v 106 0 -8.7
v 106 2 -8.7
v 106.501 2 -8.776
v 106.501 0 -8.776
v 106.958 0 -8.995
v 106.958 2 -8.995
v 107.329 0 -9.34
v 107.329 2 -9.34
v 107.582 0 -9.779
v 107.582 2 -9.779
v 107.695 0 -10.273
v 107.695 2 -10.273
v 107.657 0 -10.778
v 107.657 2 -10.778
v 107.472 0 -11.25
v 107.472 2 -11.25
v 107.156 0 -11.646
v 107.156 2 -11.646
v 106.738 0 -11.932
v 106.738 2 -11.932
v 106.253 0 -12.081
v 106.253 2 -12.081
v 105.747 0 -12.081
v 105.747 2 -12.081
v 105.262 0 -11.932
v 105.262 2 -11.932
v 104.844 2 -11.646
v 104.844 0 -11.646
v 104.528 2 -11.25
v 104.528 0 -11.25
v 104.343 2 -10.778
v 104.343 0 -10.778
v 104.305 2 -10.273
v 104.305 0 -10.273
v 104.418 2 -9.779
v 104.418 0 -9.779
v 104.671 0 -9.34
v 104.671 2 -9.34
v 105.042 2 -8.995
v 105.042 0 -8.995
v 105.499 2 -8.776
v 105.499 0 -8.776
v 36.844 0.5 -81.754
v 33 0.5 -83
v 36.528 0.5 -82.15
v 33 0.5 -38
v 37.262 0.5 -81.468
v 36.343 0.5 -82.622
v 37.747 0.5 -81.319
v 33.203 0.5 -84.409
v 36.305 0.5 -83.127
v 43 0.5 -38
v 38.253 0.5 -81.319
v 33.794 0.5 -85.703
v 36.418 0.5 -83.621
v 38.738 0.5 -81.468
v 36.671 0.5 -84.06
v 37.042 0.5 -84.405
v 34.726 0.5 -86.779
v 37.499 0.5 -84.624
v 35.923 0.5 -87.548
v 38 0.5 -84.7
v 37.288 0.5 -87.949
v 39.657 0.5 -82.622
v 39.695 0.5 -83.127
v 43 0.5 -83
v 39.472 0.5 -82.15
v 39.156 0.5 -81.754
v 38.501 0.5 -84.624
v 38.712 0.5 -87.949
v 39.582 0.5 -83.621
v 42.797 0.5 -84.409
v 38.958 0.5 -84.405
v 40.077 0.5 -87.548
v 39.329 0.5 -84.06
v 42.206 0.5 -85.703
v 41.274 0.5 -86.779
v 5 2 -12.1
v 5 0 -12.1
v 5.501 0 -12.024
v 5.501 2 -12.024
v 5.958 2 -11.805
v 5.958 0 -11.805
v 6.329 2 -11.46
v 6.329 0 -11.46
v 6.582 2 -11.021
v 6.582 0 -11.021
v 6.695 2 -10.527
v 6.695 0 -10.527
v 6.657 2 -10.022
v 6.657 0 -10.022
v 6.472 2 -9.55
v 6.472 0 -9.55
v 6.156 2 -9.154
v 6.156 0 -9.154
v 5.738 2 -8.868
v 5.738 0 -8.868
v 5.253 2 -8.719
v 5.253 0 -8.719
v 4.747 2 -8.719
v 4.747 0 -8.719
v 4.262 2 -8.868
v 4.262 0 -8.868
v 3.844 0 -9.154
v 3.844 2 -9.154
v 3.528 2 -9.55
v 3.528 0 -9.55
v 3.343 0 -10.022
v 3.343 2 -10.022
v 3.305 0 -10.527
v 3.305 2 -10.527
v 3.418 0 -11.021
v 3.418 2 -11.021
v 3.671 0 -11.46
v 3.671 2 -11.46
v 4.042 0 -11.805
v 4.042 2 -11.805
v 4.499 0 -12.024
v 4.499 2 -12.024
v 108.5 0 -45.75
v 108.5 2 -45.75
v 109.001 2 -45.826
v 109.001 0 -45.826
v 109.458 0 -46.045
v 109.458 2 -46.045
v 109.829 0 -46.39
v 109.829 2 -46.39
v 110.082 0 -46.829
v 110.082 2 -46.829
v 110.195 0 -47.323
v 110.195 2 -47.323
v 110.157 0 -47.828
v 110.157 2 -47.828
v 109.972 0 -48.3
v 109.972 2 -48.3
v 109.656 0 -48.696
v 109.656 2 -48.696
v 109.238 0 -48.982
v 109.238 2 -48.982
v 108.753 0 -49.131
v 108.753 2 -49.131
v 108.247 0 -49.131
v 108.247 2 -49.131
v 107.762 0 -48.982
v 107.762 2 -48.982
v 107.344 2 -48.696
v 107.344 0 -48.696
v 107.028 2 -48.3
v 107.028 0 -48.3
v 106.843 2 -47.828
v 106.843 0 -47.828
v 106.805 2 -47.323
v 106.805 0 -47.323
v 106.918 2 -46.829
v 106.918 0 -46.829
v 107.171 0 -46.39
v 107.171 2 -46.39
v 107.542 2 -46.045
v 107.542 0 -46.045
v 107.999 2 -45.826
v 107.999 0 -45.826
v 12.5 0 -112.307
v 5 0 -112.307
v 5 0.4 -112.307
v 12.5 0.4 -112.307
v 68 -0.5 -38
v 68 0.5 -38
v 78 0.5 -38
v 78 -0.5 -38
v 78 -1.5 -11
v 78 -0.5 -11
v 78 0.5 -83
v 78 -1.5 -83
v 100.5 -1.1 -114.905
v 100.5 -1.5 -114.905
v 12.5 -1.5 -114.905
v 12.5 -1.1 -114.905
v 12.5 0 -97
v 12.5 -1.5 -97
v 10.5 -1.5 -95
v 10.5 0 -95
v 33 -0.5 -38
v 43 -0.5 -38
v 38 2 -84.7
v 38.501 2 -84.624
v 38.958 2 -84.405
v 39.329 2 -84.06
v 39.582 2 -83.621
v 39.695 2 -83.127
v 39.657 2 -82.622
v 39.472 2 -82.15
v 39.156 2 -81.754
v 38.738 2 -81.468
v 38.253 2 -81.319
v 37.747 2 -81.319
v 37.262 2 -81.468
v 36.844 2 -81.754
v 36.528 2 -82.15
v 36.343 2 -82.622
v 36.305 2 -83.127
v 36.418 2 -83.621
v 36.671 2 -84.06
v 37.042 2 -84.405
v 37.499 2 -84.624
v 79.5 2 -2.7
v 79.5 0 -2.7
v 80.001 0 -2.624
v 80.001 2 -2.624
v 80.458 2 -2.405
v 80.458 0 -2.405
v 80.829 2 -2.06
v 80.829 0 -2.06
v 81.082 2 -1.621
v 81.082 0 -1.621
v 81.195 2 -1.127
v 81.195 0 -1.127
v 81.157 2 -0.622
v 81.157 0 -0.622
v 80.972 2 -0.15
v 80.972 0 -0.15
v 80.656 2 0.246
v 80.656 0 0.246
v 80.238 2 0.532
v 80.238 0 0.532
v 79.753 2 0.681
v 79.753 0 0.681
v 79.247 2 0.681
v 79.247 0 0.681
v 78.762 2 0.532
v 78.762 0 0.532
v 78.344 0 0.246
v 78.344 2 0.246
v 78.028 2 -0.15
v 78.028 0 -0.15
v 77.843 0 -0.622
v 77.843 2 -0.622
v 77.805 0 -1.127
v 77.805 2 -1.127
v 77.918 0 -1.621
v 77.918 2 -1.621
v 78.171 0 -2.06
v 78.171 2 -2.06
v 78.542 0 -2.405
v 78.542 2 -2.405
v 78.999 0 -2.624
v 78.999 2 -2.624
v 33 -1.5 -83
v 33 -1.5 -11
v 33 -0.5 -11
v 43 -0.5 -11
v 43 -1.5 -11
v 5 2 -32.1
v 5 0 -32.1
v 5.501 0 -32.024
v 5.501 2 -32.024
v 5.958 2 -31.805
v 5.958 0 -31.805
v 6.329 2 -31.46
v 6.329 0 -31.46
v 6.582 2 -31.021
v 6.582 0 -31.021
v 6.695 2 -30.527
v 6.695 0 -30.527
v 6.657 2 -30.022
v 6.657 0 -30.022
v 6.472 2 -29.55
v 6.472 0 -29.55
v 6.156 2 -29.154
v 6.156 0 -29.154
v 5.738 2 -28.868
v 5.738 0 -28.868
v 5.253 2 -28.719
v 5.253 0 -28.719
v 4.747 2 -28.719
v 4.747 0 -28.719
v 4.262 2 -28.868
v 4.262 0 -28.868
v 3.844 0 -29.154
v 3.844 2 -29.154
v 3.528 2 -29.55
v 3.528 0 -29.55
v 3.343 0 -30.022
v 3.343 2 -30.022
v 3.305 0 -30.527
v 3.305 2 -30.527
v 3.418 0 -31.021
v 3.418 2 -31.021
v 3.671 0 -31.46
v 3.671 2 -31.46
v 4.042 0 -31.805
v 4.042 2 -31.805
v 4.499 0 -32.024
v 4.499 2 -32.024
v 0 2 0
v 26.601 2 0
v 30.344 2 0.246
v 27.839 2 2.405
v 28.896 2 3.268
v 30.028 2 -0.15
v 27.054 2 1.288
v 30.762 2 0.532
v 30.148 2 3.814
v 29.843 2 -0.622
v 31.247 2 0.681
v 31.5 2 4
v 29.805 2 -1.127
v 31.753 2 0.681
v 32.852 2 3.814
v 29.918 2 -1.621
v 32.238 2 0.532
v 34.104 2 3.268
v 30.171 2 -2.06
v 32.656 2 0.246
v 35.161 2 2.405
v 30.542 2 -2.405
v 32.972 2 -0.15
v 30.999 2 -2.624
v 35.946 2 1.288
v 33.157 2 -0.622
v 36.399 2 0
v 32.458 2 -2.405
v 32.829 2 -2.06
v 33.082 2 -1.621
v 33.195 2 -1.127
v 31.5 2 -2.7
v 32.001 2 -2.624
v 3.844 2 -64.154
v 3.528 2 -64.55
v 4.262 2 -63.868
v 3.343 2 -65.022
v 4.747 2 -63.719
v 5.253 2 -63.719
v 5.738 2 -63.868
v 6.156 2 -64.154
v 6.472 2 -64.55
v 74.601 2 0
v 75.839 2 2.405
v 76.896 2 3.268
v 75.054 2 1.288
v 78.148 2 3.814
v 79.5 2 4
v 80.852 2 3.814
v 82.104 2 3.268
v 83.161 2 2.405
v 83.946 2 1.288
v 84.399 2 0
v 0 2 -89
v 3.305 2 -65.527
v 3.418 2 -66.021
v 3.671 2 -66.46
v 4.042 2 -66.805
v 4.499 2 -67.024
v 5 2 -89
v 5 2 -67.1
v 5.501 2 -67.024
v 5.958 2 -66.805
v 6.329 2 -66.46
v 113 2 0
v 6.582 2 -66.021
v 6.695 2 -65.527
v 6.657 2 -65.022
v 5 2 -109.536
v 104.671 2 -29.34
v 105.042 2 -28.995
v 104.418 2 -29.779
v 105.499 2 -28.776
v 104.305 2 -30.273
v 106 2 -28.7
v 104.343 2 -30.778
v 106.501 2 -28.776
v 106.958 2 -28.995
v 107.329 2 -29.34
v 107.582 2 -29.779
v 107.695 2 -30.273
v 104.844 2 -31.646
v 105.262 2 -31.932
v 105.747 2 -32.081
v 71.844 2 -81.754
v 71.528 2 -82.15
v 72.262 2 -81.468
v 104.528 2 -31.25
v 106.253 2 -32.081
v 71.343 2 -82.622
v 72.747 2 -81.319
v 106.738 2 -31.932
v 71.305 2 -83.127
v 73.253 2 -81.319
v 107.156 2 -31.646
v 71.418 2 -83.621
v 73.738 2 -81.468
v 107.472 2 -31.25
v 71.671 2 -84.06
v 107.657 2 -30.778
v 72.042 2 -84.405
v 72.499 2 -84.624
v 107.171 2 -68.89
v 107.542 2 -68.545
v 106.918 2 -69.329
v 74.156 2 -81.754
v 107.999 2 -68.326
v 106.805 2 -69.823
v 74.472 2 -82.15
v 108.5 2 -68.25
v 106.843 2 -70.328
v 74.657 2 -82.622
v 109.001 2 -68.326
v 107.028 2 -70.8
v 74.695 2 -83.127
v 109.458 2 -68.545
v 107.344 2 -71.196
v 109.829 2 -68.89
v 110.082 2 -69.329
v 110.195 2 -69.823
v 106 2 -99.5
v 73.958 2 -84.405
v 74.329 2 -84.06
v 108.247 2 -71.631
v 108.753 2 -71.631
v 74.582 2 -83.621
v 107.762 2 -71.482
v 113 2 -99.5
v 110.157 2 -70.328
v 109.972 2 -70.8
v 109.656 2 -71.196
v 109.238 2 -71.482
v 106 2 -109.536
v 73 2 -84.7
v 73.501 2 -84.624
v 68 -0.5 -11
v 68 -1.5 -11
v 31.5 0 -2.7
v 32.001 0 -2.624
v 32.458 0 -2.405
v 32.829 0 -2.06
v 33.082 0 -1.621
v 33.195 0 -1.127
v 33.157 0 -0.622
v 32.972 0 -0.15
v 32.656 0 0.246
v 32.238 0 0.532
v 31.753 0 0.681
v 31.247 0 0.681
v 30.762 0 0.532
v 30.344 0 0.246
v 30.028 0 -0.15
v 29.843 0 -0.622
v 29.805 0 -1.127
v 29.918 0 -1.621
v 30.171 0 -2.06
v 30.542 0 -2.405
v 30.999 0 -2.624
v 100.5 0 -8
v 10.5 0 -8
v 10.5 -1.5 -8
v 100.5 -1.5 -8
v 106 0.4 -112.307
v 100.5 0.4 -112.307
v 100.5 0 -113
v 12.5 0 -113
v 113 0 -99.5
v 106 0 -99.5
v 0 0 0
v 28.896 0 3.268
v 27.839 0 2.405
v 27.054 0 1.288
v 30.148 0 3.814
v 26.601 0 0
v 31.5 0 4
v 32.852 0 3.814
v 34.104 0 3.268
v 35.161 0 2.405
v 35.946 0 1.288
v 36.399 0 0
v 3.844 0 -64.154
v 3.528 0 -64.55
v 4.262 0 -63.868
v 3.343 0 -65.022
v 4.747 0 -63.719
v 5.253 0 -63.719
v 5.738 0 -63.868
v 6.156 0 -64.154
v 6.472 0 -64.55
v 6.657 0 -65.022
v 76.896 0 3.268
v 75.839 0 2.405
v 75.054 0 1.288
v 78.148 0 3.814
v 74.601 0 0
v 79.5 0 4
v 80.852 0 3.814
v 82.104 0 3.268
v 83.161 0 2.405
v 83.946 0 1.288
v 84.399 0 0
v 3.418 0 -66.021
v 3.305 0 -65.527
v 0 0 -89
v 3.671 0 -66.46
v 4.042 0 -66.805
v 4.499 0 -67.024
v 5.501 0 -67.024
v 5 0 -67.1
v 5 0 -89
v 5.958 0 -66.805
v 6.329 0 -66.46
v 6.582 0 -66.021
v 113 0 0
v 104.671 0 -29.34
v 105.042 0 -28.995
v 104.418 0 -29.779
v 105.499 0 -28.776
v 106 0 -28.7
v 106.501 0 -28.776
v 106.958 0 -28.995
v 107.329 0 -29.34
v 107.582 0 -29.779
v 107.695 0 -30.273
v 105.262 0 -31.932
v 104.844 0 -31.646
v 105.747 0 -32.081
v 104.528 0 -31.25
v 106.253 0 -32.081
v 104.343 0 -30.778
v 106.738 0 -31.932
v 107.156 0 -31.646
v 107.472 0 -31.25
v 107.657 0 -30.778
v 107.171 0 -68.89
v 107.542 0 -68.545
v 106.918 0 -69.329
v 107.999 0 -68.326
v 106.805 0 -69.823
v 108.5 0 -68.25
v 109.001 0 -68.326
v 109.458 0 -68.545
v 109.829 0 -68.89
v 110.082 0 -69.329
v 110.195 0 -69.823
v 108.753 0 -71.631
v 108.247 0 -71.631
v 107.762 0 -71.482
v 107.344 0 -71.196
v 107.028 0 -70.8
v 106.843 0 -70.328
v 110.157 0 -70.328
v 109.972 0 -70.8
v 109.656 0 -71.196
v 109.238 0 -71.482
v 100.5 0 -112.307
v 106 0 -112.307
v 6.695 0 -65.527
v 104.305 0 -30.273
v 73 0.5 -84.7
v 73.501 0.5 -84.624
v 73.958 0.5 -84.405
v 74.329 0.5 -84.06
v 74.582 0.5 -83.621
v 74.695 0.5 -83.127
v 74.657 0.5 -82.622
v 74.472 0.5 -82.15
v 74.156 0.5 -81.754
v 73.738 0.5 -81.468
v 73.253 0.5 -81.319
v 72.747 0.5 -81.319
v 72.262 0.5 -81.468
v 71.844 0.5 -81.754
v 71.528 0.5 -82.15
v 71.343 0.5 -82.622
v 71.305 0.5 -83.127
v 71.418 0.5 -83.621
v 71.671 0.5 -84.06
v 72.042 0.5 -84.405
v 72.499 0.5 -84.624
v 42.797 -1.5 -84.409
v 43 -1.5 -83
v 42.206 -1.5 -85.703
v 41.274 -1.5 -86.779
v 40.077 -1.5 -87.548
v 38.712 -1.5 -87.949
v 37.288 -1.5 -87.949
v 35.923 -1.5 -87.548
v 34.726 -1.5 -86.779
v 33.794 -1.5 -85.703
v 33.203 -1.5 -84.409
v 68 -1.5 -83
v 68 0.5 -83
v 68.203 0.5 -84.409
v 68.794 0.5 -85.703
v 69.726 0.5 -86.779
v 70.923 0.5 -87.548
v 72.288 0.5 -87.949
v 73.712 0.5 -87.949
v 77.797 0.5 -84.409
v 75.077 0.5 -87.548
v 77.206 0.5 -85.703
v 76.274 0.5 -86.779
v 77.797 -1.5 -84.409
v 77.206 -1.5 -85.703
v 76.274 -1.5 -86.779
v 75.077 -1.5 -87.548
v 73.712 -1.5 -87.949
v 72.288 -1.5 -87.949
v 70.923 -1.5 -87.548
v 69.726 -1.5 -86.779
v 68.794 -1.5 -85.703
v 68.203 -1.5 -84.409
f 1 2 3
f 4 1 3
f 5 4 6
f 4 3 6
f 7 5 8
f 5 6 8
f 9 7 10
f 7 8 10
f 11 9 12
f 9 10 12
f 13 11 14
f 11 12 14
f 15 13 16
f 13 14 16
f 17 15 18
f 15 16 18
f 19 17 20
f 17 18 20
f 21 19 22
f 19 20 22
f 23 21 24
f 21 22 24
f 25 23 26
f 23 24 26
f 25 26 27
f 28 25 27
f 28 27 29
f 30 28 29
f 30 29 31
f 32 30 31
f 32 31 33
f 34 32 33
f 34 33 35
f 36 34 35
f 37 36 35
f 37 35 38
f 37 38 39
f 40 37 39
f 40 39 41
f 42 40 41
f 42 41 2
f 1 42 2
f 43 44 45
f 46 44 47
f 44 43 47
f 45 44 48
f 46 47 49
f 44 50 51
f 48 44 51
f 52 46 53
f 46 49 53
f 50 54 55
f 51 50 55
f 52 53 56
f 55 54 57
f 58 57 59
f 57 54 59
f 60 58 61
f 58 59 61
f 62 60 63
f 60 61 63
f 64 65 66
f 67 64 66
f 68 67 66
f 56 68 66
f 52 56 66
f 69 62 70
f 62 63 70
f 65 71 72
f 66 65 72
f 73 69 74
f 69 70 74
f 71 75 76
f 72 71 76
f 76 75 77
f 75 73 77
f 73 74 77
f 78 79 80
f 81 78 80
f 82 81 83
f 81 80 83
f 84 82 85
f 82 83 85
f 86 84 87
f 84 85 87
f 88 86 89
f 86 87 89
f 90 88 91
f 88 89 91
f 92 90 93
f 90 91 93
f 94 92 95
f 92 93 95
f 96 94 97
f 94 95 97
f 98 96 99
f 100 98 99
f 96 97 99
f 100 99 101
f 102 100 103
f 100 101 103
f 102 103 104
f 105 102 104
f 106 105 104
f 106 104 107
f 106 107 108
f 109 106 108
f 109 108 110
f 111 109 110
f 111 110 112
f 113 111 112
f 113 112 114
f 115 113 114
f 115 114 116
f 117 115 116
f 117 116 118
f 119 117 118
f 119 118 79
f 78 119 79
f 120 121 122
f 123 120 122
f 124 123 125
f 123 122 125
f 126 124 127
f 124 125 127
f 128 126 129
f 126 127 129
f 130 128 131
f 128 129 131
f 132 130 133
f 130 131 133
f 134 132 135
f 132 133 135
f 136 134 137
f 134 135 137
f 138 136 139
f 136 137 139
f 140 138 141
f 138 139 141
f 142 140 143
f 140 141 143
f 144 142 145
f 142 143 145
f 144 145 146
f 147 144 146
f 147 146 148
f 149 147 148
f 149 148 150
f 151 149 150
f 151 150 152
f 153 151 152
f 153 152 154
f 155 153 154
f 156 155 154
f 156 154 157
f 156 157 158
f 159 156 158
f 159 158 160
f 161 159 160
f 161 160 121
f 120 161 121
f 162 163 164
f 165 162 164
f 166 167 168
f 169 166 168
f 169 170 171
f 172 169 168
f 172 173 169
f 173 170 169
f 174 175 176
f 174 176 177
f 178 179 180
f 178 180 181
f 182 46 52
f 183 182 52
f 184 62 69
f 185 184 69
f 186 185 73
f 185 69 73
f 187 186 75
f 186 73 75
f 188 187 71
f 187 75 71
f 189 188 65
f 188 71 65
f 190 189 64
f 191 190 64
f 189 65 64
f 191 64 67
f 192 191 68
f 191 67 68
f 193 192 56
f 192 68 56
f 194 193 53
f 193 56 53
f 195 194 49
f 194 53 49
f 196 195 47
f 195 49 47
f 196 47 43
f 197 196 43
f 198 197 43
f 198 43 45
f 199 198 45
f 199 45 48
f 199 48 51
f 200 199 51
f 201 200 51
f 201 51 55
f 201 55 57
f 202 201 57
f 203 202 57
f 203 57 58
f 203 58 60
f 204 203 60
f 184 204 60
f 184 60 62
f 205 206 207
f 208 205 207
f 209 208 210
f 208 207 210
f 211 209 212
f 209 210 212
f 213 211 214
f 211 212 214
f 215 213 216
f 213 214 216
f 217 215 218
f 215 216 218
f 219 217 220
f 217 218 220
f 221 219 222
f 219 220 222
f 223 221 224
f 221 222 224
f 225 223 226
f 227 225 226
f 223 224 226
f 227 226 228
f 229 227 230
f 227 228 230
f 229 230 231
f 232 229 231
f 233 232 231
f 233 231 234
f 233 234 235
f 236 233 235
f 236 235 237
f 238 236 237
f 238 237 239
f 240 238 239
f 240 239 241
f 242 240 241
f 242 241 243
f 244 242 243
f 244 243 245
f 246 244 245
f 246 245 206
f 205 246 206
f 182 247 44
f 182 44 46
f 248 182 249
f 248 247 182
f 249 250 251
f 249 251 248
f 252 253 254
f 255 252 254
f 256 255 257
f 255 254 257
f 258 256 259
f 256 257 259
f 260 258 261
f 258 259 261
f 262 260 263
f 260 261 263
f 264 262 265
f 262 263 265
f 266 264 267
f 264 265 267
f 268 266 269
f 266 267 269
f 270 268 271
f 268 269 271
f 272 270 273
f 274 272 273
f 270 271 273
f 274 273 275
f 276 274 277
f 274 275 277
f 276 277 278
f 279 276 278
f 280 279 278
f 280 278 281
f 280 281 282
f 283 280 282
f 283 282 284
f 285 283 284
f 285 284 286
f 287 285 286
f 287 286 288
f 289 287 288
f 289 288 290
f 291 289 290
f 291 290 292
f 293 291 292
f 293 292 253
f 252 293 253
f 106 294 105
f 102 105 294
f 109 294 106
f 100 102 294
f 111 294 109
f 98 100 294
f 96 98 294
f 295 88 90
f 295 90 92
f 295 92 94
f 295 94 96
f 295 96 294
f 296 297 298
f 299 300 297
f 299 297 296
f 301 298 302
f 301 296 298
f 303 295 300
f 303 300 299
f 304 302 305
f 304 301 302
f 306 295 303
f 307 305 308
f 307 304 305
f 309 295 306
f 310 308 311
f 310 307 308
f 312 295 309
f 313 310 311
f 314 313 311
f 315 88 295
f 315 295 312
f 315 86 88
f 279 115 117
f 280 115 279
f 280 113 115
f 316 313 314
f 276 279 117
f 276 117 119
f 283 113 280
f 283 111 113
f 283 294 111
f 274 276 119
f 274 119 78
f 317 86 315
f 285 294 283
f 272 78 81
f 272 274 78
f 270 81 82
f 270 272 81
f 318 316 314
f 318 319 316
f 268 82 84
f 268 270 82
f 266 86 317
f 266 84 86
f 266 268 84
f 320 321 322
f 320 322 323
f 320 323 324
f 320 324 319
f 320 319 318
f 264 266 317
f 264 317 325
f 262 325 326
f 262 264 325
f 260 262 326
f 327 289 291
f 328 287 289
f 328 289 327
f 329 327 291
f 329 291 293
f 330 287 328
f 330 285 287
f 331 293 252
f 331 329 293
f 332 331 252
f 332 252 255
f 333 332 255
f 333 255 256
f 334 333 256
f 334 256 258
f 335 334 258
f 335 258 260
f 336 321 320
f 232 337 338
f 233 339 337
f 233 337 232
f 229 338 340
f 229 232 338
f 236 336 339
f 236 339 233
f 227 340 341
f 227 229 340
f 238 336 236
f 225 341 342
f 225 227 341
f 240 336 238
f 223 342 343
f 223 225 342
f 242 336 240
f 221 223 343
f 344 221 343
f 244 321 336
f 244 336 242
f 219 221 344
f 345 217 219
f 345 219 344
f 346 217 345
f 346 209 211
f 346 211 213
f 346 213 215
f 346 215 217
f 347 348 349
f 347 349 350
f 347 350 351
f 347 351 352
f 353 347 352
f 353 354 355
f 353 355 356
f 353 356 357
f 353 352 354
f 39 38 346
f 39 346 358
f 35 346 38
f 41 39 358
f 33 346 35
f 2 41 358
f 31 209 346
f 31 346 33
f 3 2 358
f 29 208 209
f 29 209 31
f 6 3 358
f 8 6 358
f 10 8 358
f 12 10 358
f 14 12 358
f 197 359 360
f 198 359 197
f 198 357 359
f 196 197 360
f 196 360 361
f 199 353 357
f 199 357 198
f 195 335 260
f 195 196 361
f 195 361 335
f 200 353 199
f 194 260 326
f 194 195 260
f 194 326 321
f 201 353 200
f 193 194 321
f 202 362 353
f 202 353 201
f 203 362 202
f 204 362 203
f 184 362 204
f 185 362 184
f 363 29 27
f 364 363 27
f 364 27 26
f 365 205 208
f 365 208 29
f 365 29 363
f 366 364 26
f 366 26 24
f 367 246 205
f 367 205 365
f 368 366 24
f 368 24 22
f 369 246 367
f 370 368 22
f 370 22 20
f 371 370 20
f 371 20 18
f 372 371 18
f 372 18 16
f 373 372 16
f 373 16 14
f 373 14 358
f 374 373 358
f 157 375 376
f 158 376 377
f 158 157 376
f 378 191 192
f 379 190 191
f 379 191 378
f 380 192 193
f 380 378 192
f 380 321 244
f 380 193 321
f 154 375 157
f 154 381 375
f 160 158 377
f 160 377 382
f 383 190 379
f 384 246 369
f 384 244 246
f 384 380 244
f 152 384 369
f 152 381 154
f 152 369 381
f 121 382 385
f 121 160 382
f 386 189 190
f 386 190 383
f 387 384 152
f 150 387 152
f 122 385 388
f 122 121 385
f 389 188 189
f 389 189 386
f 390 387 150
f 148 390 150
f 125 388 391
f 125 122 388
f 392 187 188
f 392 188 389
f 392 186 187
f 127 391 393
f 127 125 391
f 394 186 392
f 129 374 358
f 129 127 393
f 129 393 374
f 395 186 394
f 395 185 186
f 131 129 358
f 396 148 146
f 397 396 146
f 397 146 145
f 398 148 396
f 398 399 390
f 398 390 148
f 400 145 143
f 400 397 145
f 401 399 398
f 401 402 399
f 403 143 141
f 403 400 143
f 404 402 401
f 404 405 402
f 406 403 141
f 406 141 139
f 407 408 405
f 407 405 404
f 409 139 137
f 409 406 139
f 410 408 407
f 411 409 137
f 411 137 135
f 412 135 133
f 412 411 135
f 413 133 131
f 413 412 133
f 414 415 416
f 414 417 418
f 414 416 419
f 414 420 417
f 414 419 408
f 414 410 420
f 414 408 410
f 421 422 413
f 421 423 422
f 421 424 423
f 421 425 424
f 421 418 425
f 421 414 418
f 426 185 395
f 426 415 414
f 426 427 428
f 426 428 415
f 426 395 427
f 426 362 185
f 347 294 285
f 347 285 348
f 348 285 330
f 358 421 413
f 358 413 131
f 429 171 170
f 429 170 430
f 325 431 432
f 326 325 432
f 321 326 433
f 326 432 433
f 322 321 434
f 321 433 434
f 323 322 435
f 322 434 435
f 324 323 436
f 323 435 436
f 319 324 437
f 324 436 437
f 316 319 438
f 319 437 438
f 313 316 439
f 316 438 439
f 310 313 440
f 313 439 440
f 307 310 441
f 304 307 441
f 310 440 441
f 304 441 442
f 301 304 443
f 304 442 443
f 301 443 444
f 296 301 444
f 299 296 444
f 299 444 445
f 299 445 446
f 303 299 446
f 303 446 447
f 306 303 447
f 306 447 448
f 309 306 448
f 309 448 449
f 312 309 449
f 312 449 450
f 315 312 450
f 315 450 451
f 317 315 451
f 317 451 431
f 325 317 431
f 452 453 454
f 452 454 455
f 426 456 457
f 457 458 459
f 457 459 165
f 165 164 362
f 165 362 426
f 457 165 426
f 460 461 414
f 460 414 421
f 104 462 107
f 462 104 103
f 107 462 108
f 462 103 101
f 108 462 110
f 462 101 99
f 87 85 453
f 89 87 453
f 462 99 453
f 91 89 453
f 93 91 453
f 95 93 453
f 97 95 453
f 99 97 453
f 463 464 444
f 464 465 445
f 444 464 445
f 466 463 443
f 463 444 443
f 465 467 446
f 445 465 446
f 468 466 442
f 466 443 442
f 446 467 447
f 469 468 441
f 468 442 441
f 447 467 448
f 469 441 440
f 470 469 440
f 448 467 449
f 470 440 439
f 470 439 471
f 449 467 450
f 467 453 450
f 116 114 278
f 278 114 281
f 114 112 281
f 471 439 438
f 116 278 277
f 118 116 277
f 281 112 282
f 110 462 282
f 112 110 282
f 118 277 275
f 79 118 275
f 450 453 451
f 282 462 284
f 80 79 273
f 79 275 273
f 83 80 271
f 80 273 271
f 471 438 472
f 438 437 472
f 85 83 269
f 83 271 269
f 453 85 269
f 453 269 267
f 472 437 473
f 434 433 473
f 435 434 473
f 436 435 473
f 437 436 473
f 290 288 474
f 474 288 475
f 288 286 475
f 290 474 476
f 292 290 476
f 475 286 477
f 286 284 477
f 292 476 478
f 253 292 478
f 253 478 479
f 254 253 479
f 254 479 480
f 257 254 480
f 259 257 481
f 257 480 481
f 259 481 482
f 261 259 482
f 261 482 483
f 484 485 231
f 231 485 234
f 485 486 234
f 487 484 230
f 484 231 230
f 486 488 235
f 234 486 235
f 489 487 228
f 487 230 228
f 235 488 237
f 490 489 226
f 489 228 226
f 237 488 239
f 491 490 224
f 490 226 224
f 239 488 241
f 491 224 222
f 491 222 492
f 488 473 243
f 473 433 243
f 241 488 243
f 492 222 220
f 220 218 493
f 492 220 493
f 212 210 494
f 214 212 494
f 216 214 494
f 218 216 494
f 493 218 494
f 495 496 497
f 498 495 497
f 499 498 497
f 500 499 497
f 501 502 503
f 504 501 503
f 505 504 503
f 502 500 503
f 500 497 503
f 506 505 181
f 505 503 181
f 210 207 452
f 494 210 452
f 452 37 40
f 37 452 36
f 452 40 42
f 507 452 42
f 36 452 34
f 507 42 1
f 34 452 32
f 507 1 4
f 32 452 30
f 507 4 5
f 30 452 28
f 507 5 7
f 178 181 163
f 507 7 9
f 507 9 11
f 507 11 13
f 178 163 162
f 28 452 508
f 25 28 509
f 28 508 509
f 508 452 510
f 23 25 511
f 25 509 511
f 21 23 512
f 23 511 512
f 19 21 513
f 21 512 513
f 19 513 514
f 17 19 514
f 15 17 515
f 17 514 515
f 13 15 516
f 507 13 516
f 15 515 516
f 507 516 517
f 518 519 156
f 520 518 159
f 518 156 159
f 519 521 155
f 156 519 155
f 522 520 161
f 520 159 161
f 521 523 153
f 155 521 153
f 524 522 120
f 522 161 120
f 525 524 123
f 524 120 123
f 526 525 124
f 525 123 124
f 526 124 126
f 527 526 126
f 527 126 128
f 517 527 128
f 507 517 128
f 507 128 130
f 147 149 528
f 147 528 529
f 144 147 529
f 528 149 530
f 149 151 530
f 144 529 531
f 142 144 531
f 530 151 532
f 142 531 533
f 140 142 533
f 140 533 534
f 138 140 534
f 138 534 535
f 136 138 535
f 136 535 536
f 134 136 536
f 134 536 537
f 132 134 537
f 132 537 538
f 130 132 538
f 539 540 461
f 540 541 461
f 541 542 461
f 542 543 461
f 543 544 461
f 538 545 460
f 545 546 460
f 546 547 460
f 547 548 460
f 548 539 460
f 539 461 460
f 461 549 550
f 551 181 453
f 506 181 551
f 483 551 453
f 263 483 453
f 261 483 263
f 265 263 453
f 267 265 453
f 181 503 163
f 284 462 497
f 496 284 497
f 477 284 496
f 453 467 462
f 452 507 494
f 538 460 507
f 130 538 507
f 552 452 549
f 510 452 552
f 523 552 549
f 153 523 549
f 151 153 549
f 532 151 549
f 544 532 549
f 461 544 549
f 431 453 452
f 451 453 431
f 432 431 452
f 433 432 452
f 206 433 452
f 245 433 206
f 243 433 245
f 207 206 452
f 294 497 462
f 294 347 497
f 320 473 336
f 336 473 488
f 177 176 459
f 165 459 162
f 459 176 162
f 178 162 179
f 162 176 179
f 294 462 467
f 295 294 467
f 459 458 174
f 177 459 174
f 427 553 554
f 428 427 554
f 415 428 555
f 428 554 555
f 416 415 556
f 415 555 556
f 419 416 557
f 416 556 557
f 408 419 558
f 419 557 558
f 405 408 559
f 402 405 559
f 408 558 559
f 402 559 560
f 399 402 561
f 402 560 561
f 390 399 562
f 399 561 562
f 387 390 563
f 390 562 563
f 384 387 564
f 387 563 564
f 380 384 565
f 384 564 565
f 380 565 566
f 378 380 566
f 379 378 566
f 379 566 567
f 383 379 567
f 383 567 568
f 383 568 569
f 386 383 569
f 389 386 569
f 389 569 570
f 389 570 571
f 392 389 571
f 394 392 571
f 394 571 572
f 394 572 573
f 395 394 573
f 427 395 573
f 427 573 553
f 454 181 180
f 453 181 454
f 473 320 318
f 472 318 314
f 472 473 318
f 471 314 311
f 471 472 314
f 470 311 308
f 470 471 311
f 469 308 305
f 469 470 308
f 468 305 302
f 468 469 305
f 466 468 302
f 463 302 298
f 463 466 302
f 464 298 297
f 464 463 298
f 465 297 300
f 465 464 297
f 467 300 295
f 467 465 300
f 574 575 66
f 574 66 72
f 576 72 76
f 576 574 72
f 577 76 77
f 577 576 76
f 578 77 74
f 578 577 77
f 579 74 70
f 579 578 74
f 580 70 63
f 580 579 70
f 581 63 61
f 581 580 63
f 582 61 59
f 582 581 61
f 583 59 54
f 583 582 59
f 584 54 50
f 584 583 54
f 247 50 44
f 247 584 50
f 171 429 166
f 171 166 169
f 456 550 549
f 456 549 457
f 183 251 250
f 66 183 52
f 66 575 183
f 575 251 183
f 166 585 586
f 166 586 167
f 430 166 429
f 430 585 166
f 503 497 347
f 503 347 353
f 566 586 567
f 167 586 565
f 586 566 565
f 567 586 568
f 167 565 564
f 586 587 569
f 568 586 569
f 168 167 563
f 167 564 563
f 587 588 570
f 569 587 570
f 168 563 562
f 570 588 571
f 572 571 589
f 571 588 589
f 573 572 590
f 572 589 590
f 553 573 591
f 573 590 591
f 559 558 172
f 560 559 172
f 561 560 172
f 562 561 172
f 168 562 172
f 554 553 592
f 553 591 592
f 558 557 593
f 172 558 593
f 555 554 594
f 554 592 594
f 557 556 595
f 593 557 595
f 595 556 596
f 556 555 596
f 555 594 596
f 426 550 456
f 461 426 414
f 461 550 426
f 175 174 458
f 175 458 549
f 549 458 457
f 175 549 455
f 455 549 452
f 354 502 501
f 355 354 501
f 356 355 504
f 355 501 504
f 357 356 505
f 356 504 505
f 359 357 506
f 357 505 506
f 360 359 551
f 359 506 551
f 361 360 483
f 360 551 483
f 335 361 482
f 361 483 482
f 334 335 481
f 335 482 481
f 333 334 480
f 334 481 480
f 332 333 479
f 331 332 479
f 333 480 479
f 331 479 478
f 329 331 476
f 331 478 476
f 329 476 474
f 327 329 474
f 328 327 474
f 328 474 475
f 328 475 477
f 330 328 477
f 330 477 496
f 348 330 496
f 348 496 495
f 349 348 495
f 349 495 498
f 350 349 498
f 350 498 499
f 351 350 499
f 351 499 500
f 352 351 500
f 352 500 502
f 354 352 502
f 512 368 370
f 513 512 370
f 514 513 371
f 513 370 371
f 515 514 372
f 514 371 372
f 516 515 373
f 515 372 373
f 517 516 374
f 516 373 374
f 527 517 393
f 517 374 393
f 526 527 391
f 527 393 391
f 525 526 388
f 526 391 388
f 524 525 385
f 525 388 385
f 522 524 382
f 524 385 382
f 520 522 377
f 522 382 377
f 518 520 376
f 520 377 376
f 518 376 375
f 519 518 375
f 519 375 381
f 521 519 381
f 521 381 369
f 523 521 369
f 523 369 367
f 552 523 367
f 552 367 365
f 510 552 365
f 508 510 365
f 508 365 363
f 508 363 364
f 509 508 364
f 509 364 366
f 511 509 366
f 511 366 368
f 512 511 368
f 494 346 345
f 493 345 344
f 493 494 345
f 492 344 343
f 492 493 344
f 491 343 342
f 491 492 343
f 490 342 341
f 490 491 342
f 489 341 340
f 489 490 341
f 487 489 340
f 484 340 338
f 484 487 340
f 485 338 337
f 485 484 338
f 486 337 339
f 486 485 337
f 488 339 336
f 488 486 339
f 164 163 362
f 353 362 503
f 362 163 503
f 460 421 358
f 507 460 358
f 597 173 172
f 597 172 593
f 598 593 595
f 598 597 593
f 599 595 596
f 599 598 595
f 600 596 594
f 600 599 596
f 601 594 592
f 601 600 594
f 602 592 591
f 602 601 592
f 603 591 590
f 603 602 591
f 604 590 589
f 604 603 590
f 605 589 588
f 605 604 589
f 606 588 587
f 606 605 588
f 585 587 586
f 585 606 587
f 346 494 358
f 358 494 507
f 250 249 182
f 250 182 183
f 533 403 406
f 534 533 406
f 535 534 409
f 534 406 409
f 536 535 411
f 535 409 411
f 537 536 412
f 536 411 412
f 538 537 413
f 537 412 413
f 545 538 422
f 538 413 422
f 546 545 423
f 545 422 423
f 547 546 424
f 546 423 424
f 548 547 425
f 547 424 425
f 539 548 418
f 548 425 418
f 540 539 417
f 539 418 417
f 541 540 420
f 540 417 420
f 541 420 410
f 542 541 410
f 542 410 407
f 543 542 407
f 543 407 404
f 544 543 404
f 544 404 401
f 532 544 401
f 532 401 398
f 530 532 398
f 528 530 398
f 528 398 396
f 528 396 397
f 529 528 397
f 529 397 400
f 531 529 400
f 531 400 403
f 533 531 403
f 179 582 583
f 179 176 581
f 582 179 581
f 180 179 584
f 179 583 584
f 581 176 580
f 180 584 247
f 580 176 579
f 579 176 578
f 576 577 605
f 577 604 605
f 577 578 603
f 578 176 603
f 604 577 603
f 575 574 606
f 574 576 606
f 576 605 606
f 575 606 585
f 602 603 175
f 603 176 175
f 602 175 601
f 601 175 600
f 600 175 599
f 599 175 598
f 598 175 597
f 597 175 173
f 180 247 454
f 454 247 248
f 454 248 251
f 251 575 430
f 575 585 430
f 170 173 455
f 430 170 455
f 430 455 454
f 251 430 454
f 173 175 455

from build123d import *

# Parameters (mm, degrees)
SKETCH_1_W           = 113
SKETCH_1_H           = 113
EXTRUDE_1_DEPTH      = 3
CUT_EXTRUDE_1_REACH  = 161.834
SKETCH_2_R           = 1.7
SKETCH_3_W           = 90
SKETCH_3_H           = 105
EXTRUDE_2_DEPTH      = 1.5
SKETCH_5_R           = 5
EXTRUDE_3_DEPTH      = 3
CUT_EXTRUDE_2_REACH  = 161.834
SKETCH_6_R           = 1.7
CUT_EXTRUDE_3_REACH  = 161.834
SKETCH_7_R           = 1.7
CUT_EXTRUDE_4_REACH  = 161.869
SKETCH_8_R           = 1.7
EXTRUDE_5_DEPTH      = 90
CUT_EXTRUDE_5_DEPTH  = 2
SKETCH_13_W          = 2
SKETCH_13_H          = 12
EXTRUDE_6_DEPTH      = 11.5
CUT_EXTRUDE_6_REACH  = 161.985
SKETCH_14_R          = 1.7
CUT_EXTRUDE_7_REACH  = 164.062
EXTRUDE_7_DEPTH      = 8.5
SKETCH_17_W          = 2
SKETCH_17_H          = 11.5
EXTRUDE_8_DEPTH      = 3
FILLET_1_R           = 1
CUT_EXTRUDE_8_DEPTH  = 163.062226394
SKETCH_20_W          = 113
SKETCH_20_H          = 12.124355653
CUT_EXTRUDE_9_DEPTH  = 1
CHAMFER_1_SIZE       = 1
SKETCH_21_W          = 7
SKETCH_21_H          = 13.5
CUT_EXTRUDE_10_DEPTH = 163.062226394
SKETCH_22_W          = 5
SKETCH_22_H          = 24
CUT_EXTRUDE_11_DEPTH = 163.062226394
SKETCH_23_W          = 2
SKETCH_23_H          = 18.598076211
CUT_EXTRUDE_12_DEPTH = 1.5
CHAMFER_2_SIZE       = 2
SKETCH_24_W          = 0.692820323
SKETCH_24_H          = 0.4
CUT_EXTRUDE_13_DEPTH = 95.5
SKETCH_25_W          = 0.692820323
SKETCH_25_H          = 0.4
CUT_EXTRUDE_14_DEPTH = 5.5
SKETCH_26_W          = 0.692820323
SKETCH_26_H          = 0.4
CUT_EXTRUDE_15_DEPTH = 7.5
SKETCH_27_W          = 113
SKETCH_27_H          = 105.875644347
CUT_EXTRUDE_16_DEPTH = 162.723430061
SKETCH_29_W          = 10
SKETCH_29_H          = 5
CUT_EXTRUDE_17_DEPTH = 162.605129345
SKETCH_30_W          = 10
SKETCH_30_H          = 2
CUT_EXTRUDE_18_DEPTH = 37
SKETCH_31_W          = 10
SKETCH_31_H          = 27
EXTRUDE_9_DEPTH      = 1
CUT_EXTRUDE_19_REACH = 163.569
SKETCH_32_W          = 5
SKETCH_32_H          = 12


with BuildPart() as part:
    # 草图1 → 凸台-拉伸1 (new body)
    with BuildSketch(Plane(origin=(0, 0, 0), x_dir=(1, 0, 0), z_dir=(0, 1, 0))):
        with Locations((56.5, 56.5)):
            Rectangle(SKETCH_1_W, SKETCH_1_H)
    extrude(amount=EXTRUDE_1_DEPTH)

    # 草图2 → 切除-拉伸1 (cut, up to next)
    with BuildSketch(Plane(origin=(0, 3, 0), x_dir=(1, 0, 0), z_dir=(0, 1, 0)), mode=Mode.PRIVATE) as cut_extrude_1_sk1:
        with Locations(Location((108.5, 69.95, 0), (0, 0, 270))):
            Circle(SKETCH_2_R)
    cut_extrude_1_tool1 = extrude(cut_extrude_1_sk1.sketch, amount=-CUT_EXTRUDE_1_REACH, mode=Mode.PRIVATE) & part.part
    # 草图2 → 切除-拉伸1 (cut, up to next)
    with BuildSketch(Plane(origin=(0, 3, 0), x_dir=(1, 0, 0), z_dir=(0, 1, 0)), mode=Mode.PRIVATE) as cut_extrude_1_sk2:
        with Locations(Location((108.5, 47.45, 0), (0, 0, 270))):
            Circle(SKETCH_2_R)
    cut_extrude_1_tool2 = extrude(cut_extrude_1_sk2.sketch, amount=-CUT_EXTRUDE_1_REACH, mode=Mode.PRIVATE) & part.part
    # 草图2 → 切除-拉伸1 (cut, up to next)
    with BuildSketch(Plane(origin=(0, 3, 0), x_dir=(1, 0, 0), z_dir=(0, 1, 0)), mode=Mode.PRIVATE) as cut_extrude_1_sk3:
        with Locations(Location((106, 30.4, 0), (0, 0, 270))):
            Circle(SKETCH_2_R)
    cut_extrude_1_tool3 = extrude(cut_extrude_1_sk3.sketch, amount=-CUT_EXTRUDE_1_REACH, mode=Mode.PRIVATE) & part.part
    # 草图2 → 切除-拉伸1 (cut, up to next)
    with BuildSketch(Plane(origin=(0, 3, 0), x_dir=(1, 0, 0), z_dir=(0, 1, 0)), mode=Mode.PRIVATE) as cut_extrude_1_sk4:
        with Locations(Location((106, 10.4, 0), (0, 0, 270))):
            Circle(SKETCH_2_R)
    cut_extrude_1_tool4 = extrude(cut_extrude_1_sk4.sketch, amount=-CUT_EXTRUDE_1_REACH, mode=Mode.PRIVATE) & part.part
    add(cut_extrude_1_tool1.solids().sort_by_distance((108.5, 3, -69.95))[0], mode=Mode.SUBTRACT)
    add(cut_extrude_1_tool2.solids().sort_by_distance((108.5, 3, -47.45))[0], mode=Mode.SUBTRACT)
    add(cut_extrude_1_tool3.solids().sort_by_distance((106, 3, -30.4))[0], mode=Mode.SUBTRACT)
    add(cut_extrude_1_tool4.solids().sort_by_distance((106, 3, -10.4))[0], mode=Mode.SUBTRACT)

    # 草图3 → 凸台-拉伸2 (add)
    with BuildSketch(Plane(origin=(0, 0, 0), x_dir=(1, 0, 0), z_dir=(0, 1, 0))):
        with Locations((55.5, 60.5)):
            Rectangle(SKETCH_3_W, SKETCH_3_H)
    extrude(amount=-EXTRUDE_2_DEPTH)

    # 草图5 → 凸台-拉伸3 (add)
    with BuildSketch(Plane.XZ):
        with Locations((79.5, -1)):
            Circle(SKETCH_5_R)
        with Locations((31.5, -1)):
            Circle(SKETCH_5_R)
    extrude(amount=-EXTRUDE_3_DEPTH)

    # 草图6 → 切除-拉伸2 (cut, up to next)
    with BuildSketch(Plane.XZ, mode=Mode.PRIVATE) as cut_extrude_2_sk1:
        with Locations(Location((31.5, -1, 0), (0, 0, 270))):
            Circle(SKETCH_6_R)
    cut_extrude_2_tool1 = extrude(cut_extrude_2_sk1.sketch, amount=-CUT_EXTRUDE_2_REACH, mode=Mode.PRIVATE) & part.part
    # 草图6 → 切除-拉伸2 (cut, up to next)
    with BuildSketch(Plane.XZ, mode=Mode.PRIVATE) as cut_extrude_2_sk2:
        with Locations(Location((79.5, -1, 0), (0, 0, 270))):
            Circle(SKETCH_6_R)
    cut_extrude_2_tool2 = extrude(cut_extrude_2_sk2.sketch, amount=-CUT_EXTRUDE_2_REACH, mode=Mode.PRIVATE) & part.part
    add(cut_extrude_2_tool1.solids().sort_by_distance((31.5, 0, -1))[0], mode=Mode.SUBTRACT)
    add(cut_extrude_2_tool2.solids().sort_by_distance((79.5, 0, -1))[0], mode=Mode.SUBTRACT)

    # 草图7 → 切除-拉伸3 (cut, up to next)
    with BuildSketch(Plane.XZ, mode=Mode.PRIVATE) as cut_extrude_3_sk1:
        with Locations(Location((5, -10.4, 0), (0, 0, 270))):
            Circle(SKETCH_7_R)
    cut_extrude_3_tool1 = extrude(cut_extrude_3_sk1.sketch, amount=-CUT_EXTRUDE_3_REACH, mode=Mode.PRIVATE) & part.part
    # 草图7 → 切除-拉伸3 (cut, up to next)
    with BuildSketch(Plane.XZ, mode=Mode.PRIVATE) as cut_extrude_3_sk2:
        with Locations(Location((5, -30.4, 0), (0, 0, 270))):
            Circle(SKETCH_7_R)
    cut_extrude_3_tool2 = extrude(cut_extrude_3_sk2.sketch, amount=-CUT_EXTRUDE_3_REACH, mode=Mode.PRIVATE) & part.part
    # 草图7 → 切除-拉伸3 (cut, up to next)
    with BuildSketch(Plane.XZ, mode=Mode.PRIVATE) as cut_extrude_3_sk3:
        with Locations(Location((5, -65.4, 0), (0, 0, 270))):
            Circle(SKETCH_7_R)
    cut_extrude_3_tool3 = extrude(cut_extrude_3_sk3.sketch, amount=-CUT_EXTRUDE_3_REACH, mode=Mode.PRIVATE) & part.part
    add(cut_extrude_3_tool1.solids().sort_by_distance((5, 0, -10.4))[0], mode=Mode.SUBTRACT)
    add(cut_extrude_3_tool2.solids().sort_by_distance((5, 0, -30.4))[0], mode=Mode.SUBTRACT)
    add(cut_extrude_3_tool3.solids().sort_by_distance((5, 0, -65.4))[0], mode=Mode.SUBTRACT)

    # 草图8 → 切除-拉伸4 (cut, up to next)
    with BuildSketch(Plane.XZ.offset(1.5), mode=Mode.PRIVATE) as cut_extrude_4_sk1:
        with Locations(Location((38, -83, 0), (0, 0, 270))):
            Circle(SKETCH_8_R)
    cut_extrude_4_tool1 = extrude(cut_extrude_4_sk1.sketch, amount=-CUT_EXTRUDE_4_REACH, mode=Mode.PRIVATE) & part.part
    # 草图8 → 切除-拉伸4 (cut, up to next)
    with BuildSketch(Plane.XZ.offset(1.5), mode=Mode.PRIVATE) as cut_extrude_4_sk2:
        with Locations(Location((73, -83, 0), (0, 0, 270))):
            Circle(SKETCH_8_R)
    cut_extrude_4_tool2 = extrude(cut_extrude_4_sk2.sketch, amount=-CUT_EXTRUDE_4_REACH, mode=Mode.PRIVATE) & part.part
    add(cut_extrude_4_tool1.solids().sort_by_distance((38, -1.5, -83))[0], mode=Mode.SUBTRACT)
    add(cut_extrude_4_tool2.solids().sort_by_distance((73, -1.5, -83))[0], mode=Mode.SUBTRACT)

    # 草图10 → 凸台-拉伸5 (add)
    with BuildSketch(Plane(origin=(100.5, 0, 0), x_dir=(0, 0, -1), z_dir=(1, 0, 0))):
        Polygon((113, 0), (115.598076211, -1.5), (113, -1.5), align=None)
    extrude(amount=-EXTRUDE_5_DEPTH)

    # 草图11 → 切除-拉伸5 (cut)
    with BuildSketch(Plane(origin=(0, -1.5, 0), x_dir=(1, 0, 0), z_dir=(0, 1, 0))):
        with BuildLine():
            Line((33, 83), (33, 53))
            ThreePointArc((33, 53), (38, 48), (43, 53))
            Line((43, 53), (43, 83))
            ThreePointArc((43, 83), (38, 88), (33, 83))
        make_face()
        with BuildLine():
            Line((68, 83), (68, 53))
            ThreePointArc((68, 53), (73, 48), (78, 53))
            Line((78, 53), (78, 83))
            ThreePointArc((78, 83), (73, 88), (68, 83))
        make_face()
    extrude(amount=CUT_EXTRUDE_5_DEPTH, mode=Mode.SUBTRACT)

    # 草图13 → 凸台-拉伸6 (add)
    with BuildSketch(Plane.XZ):
        with Locations((4, -83)):
            Rectangle(SKETCH_13_W, SKETCH_13_H)
    extrude(amount=EXTRUDE_6_DEPTH)

    # 草图14 → 切除-拉伸6 (cut, up to next)
    with BuildSketch(Plane.ZY.offset(-3), mode=Mode.PRIVATE) as cut_extrude_6_sk1:
        with Locations((-83.5, -5)):
            Circle(SKETCH_14_R)
    cut_extrude_6_tool1 = extrude(cut_extrude_6_sk1.sketch, amount=-CUT_EXTRUDE_6_REACH, mode=Mode.PRIVATE) & part.part
    add(cut_extrude_6_tool1.solids().sort_by_distance((3, -5, -83.5))[0], mode=Mode.SUBTRACT)

    # 草图15 → 切除-拉伸7 (cut, up to next)
    with BuildSketch(Plane.XZ, mode=Mode.PRIVATE) as cut_extrude_7_sk1:
        Polygon((113, -100.875644347), (106, -113), (113, -113), align=None)
    cut_extrude_7_tool1 = extrude(cut_extrude_7_sk1.sketch, amount=-CUT_EXTRUDE_7_REACH, mode=Mode.PRIVATE) & part.part
    add(cut_extrude_7_tool1.solids().sort_by_distance((110.666667, 0, -108.958548))[0], mode=Mode.SUBTRACT)

    # 草图16 → 凸台-拉伸7 (add)
    with BuildSketch(Plane.XZ):
        Polygon((113, -99.5), (107.5, -99.5), (107.5, -110.401923789), (113, -100.875644347), align=None)
    extrude(amount=EXTRUDE_7_DEPTH)

    # 草图17 → 凸台-拉伸8 (add)
    with BuildSketch(Plane.ZY.offset(-3)):
        with Locations((-78, -5.75)):
            Rectangle(SKETCH_17_W, SKETCH_17_H)
    extrude(amount=EXTRUDE_8_DEPTH)

    # 圆角1
    fillet_1_edges = [part.edges().sort_by_distance(p)[0] for p in [
        (3, -5.75, -79),
    ]]
    fillet(fillet_1_edges, radius=FILLET_1_R)

    # 草图19 → 切除-拉伸8 (cut, through all)
    with BuildSketch(Plane.ZY):
        Polygon((-113, 0), (-107.803847577, 3), (-113, 3), align=None)
    extrude(amount=-CUT_EXTRUDE_8_DEPTH, mode=Mode.SUBTRACT)

    # 草图20 → 切除-拉伸9 (cut)
    with BuildSketch(Plane(origin=(0, 3, 0), x_dir=(1, 0, 0), z_dir=(0, 1, 0))):
        with Locations((56.5, 106.937822173)):
            Rectangle(SKETCH_20_W, SKETCH_20_H)
    extrude(amount=-CUT_EXTRUDE_9_DEPTH, mode=Mode.SUBTRACT)

    # 倒角1
    chamfer_1_edges = [part.edges().sort_by_distance(p)[0] for p in [
        (56.5, 2, -100.875644347),
    ]]
    chamfer(chamfer_1_edges, length=CHAMFER_1_SIZE - 0.0001)  # a hair under: the kernel refuses the full size

    # 草图21 → 切除-拉伸10 (cut, through all)
    with BuildSketch(Plane.XZ.offset(8.5)):
        with Locations((109.5, -106.25)):
            Rectangle(SKETCH_21_W, SKETCH_21_H)
    extrude(amount=-CUT_EXTRUDE_10_DEPTH, mode=Mode.SUBTRACT)

    # 草图22 → 切除-拉伸11 (cut, through all)
    with BuildSketch(Plane.XZ):
        with Locations((2.5, -101)):
            Rectangle(SKETCH_22_W, SKETCH_22_H)
    extrude(amount=-CUT_EXTRUDE_11_DEPTH, mode=Mode.SUBTRACT)

    # 草图23 → 切除-拉伸12 (cut)
    with BuildSketch(Plane.XZ.offset(1.5)):
        with Locations((11.5, -106.299038106)):
            Rectangle(SKETCH_23_W, SKETCH_23_H)
    extrude(amount=-CUT_EXTRUDE_12_DEPTH, mode=Mode.SUBTRACT)

    # 倒角2
    chamfer_2_edges = [part.edges().sort_by_distance(p)[0] for p in [
        (10.5, -0.75, -97),
    ]]
    chamfer(chamfer_2_edges, length=CHAMFER_2_SIZE - 0.0001)  # a hair under: the kernel refuses the full size

    # 草图24 → 切除-拉伸13 (cut)
    with BuildSketch(Plane(origin=(100.5, 0, 0), x_dir=(0, 0, -1), z_dir=(1, 0, 0))):
        with Locations((115.25166605, -1.3)):
            Rectangle(SKETCH_24_W, SKETCH_24_H)
    extrude(amount=-CUT_EXTRUDE_13_DEPTH, mode=Mode.SUBTRACT)

    # 草图25 → 切除-拉伸14 (cut)
    with BuildSketch(Plane(origin=(106, 0, 0), x_dir=(0, 0, -1), z_dir=(1, 0, 0))):
        with Locations((112.653589839, 0.2)):
            Rectangle(SKETCH_25_W, SKETCH_25_H)
    extrude(amount=-CUT_EXTRUDE_14_DEPTH, mode=Mode.SUBTRACT)

    # 草图26 → 切除-拉伸15 (cut)
    with BuildSketch(Plane.ZY.offset(-5)):
        with Locations((-112.653589839, 0.2)):
            Rectangle(SKETCH_26_W, SKETCH_26_H)
    extrude(amount=-CUT_EXTRUDE_15_DEPTH, mode=Mode.SUBTRACT)

    # 草图27 → 切除-拉伸16 (cut, through all)
    with BuildSketch(Plane(origin=(0, 2, 0), x_dir=(1, 0, 0), z_dir=(0, 1, 0))):
        with Locations((56.5, 48.937822174)):
            Rectangle(SKETCH_27_W, SKETCH_27_H)
    extrude(amount=CUT_EXTRUDE_16_DEPTH, mode=Mode.SUBTRACT)

    # 草图29 → 切除-拉伸17 (cut, through all)
    with BuildSketch(Plane.XZ.offset(-0.5)):
        with Locations((38, -50.5)):
            Rectangle(SKETCH_29_W, SKETCH_29_H)
        with Locations((73, -50.5)):
            Rectangle(SKETCH_29_W, SKETCH_29_H)
    extrude(amount=CUT_EXTRUDE_17_DEPTH, mode=Mode.SUBTRACT)

    # 草图30 → 切除-拉伸18 (cut)
    with BuildSketch(Plane(origin=(0, 0, -48), x_dir=(-1, 0, 0), z_dir=(0, 0, -1))):
        with Locations((-38, -0.5)):
            Rectangle(SKETCH_30_W, SKETCH_30_H)
        with Locations((-73, -0.5)):
            Rectangle(SKETCH_30_W, SKETCH_30_H)
    extrude(amount=-CUT_EXTRUDE_18_DEPTH, mode=Mode.SUBTRACT)

    # 草图31 → 凸台-拉伸9 (add)
    with BuildSketch(Plane.XZ.offset(-0.5)):
        with Locations((38, -24.5)):
            Rectangle(SKETCH_31_W, SKETCH_31_H)
        with Locations((73, -24.5)):
            Rectangle(SKETCH_31_W, SKETCH_31_H)
    extrude(amount=EXTRUDE_9_DEPTH)

    # 草图32 → 切除-拉伸19 (cut, up to next)
    with BuildSketch(Plane.XZ, mode=Mode.PRIVATE) as cut_extrude_19_sk1:
        with Locations((2.5, -83)):
            Rectangle(SKETCH_32_W, SKETCH_32_H)
    cut_extrude_19_tool1 = extrude(cut_extrude_19_sk1.sketch, amount=CUT_EXTRUDE_19_REACH, mode=Mode.PRIVATE) & part.part
    add(cut_extrude_19_tool1.solids().sort_by_distance((2.5, 0, -83))[0], mode=Mode.SUBTRACT)


solid = part.part
